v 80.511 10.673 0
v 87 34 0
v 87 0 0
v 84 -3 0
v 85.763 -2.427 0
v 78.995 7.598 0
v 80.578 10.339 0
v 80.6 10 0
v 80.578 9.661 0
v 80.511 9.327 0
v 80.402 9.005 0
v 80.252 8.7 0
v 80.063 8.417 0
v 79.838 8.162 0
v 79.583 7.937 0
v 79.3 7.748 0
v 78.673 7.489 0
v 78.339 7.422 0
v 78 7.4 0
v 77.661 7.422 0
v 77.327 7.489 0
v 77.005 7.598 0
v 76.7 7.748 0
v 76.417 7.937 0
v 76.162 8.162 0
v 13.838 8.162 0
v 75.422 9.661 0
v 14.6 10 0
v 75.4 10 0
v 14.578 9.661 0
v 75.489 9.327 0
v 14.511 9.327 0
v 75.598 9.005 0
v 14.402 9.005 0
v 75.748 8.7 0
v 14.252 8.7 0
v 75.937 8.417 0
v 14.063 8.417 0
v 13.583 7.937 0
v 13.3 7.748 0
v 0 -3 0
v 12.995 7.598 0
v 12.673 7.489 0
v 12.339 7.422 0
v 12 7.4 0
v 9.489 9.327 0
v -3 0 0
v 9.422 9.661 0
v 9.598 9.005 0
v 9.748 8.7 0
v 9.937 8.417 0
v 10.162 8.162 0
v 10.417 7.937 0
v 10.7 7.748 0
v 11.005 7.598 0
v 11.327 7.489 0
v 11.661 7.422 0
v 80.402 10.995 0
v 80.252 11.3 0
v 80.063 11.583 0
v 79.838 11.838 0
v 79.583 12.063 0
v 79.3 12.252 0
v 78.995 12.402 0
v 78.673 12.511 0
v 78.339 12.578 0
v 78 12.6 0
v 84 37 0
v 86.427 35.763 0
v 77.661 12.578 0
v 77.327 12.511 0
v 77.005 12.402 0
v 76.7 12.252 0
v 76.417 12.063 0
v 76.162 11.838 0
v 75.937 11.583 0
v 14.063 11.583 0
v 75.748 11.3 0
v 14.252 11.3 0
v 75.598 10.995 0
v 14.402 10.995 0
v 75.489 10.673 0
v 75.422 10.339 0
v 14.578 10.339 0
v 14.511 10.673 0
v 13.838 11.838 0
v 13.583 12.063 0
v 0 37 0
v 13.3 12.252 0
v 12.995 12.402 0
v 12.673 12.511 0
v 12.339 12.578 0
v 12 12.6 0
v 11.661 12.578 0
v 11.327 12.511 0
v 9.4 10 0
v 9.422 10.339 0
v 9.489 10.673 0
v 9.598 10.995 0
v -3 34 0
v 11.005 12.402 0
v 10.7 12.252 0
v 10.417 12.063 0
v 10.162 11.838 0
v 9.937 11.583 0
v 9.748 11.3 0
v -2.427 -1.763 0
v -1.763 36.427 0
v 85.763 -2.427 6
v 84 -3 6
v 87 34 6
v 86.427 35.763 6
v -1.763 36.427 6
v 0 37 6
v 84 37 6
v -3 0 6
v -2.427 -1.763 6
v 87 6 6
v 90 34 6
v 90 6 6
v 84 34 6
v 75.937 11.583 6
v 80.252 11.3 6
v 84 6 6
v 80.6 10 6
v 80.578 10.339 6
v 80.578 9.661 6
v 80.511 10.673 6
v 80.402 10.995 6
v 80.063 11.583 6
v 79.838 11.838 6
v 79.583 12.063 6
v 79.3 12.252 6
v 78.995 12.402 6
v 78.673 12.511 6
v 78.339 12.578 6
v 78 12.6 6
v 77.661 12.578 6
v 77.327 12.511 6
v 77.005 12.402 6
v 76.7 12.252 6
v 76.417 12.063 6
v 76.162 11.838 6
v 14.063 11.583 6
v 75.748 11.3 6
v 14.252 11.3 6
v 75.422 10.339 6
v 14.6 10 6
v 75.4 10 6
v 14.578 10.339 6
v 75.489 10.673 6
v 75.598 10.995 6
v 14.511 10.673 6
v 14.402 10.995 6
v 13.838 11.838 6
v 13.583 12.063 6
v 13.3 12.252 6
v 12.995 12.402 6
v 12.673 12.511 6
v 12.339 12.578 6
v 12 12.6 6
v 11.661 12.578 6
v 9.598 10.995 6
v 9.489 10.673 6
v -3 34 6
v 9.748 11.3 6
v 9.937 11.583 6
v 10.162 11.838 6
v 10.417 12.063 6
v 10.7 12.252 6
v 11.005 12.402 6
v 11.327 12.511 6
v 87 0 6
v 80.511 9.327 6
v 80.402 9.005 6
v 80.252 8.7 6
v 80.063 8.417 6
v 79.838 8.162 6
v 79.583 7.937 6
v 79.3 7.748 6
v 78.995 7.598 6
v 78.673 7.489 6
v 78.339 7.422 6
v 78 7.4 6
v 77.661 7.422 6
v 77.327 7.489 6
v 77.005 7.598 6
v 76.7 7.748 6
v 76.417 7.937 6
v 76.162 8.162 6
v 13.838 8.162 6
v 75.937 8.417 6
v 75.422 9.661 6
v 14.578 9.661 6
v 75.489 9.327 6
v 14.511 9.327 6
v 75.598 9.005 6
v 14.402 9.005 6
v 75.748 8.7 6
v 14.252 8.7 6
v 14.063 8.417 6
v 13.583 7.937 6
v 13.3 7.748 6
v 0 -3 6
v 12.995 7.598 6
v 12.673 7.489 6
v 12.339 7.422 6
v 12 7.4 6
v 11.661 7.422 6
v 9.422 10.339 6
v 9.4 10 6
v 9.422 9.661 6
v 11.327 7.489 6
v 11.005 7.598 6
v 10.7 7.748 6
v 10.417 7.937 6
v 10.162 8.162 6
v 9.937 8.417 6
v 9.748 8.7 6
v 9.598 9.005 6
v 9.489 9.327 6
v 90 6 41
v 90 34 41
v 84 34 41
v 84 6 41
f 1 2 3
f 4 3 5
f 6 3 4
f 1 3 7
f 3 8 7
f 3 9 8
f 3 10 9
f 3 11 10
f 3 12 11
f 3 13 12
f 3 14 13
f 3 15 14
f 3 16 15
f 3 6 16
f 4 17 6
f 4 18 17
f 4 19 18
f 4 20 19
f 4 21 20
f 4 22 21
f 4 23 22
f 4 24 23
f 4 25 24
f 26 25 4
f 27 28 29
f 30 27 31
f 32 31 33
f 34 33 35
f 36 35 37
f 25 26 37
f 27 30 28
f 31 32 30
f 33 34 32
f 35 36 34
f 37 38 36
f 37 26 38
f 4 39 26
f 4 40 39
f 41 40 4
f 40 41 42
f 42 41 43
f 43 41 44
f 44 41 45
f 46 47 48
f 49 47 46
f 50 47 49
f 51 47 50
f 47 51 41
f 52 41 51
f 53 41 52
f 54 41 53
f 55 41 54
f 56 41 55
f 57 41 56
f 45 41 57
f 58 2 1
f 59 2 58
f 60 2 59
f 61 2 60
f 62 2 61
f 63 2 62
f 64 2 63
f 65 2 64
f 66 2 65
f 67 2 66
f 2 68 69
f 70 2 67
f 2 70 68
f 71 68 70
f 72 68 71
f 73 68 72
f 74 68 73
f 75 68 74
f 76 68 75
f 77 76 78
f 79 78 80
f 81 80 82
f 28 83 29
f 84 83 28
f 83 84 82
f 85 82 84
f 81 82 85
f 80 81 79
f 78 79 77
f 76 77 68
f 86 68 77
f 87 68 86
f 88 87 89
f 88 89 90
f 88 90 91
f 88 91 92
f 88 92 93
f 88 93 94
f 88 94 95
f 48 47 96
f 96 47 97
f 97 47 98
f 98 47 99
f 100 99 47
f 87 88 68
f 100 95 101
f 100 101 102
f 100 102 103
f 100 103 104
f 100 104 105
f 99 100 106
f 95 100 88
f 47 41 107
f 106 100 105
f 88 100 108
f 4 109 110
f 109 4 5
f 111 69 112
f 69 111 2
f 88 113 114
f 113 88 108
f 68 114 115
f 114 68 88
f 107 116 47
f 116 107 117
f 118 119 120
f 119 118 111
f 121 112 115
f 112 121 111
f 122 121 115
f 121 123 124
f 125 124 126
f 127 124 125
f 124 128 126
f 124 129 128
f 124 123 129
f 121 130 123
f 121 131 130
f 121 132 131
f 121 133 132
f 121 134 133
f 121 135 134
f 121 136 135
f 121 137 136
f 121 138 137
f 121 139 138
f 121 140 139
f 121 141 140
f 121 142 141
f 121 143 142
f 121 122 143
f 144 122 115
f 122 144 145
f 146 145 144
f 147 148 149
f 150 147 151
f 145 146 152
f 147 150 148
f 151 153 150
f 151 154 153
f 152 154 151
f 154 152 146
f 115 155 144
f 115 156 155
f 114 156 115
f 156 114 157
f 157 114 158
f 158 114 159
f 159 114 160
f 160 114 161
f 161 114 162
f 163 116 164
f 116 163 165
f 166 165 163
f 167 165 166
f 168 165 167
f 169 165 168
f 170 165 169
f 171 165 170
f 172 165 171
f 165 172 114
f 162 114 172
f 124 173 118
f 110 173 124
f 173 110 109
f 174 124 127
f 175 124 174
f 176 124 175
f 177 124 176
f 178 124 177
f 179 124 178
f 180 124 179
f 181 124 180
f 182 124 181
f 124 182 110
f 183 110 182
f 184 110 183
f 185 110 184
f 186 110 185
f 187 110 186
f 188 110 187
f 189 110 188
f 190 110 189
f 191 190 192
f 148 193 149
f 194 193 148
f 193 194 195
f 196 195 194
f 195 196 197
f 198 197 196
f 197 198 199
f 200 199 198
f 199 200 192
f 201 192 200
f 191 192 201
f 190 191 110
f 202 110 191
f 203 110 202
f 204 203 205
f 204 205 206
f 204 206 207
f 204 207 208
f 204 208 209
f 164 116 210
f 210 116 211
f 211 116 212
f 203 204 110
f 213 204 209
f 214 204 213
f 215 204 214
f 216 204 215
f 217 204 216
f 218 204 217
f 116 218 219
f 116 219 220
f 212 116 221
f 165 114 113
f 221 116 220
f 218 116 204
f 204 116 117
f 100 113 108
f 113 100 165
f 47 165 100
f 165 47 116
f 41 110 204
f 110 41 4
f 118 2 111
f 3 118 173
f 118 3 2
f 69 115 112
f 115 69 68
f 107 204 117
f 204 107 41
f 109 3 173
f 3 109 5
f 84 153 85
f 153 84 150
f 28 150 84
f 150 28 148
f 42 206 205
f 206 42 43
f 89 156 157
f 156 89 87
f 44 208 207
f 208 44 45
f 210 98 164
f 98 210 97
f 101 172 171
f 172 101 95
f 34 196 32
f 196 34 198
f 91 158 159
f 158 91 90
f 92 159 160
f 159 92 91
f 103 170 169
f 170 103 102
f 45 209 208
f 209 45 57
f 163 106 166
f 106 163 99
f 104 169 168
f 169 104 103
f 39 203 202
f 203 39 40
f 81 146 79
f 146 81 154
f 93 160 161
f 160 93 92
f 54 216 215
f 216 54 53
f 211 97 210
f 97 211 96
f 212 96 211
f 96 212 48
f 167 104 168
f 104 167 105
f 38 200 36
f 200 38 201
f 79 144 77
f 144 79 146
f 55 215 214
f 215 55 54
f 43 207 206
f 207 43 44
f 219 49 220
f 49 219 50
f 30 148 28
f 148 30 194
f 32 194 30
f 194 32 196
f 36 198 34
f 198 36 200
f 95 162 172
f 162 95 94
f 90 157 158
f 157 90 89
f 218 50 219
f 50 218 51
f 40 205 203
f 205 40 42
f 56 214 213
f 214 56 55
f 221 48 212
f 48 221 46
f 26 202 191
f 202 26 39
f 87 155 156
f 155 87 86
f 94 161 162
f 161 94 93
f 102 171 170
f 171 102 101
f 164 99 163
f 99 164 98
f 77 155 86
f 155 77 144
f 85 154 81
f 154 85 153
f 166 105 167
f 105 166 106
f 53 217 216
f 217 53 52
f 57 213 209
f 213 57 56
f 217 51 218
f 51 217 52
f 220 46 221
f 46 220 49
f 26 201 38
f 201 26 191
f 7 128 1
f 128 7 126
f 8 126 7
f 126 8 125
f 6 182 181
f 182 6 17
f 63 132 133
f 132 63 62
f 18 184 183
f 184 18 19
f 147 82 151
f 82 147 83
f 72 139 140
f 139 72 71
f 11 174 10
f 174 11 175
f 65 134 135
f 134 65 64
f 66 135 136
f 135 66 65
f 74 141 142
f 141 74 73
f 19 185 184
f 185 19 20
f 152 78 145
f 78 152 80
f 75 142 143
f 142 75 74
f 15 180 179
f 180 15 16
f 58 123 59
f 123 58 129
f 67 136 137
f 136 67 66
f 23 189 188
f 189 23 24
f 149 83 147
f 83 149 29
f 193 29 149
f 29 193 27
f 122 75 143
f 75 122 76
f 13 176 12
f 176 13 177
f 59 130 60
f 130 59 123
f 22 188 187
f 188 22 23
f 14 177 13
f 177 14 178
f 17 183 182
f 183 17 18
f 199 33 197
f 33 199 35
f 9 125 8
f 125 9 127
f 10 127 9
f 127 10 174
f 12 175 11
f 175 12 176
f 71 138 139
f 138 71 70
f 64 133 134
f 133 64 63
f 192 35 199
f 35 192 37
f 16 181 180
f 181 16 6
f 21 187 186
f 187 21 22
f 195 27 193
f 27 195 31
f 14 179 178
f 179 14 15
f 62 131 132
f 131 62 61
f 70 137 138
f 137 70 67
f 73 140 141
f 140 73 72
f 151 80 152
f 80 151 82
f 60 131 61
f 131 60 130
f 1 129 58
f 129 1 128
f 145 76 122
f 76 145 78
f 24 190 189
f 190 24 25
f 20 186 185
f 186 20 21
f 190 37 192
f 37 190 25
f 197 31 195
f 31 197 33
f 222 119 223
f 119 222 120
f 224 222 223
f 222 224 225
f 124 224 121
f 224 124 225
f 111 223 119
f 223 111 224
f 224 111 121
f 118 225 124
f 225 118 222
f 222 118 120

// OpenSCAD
part_name = "QA Camera Mount 1778435312197";

base_len = 90;
base_wid = 40;
base_thk = 6;

riser_h = 35;
riser_thk = 6;
riser_wid = 28;

hole_d = 5.2;
hole_edge_x = 12;
hole_edge_y = 10;
hole_spacing_x = 66;
hole_spacing_y = 20;

corner_r = 3;
clearance = 0.6;

module rounded_plate(l, w, t, r=2) {
linear_extrude(height=t)
offset(r=r)
square([l - 2*r, w - 2*r], center=false);
}

module base_body() {
difference() {
rounded_plate(base_len, base_wid, base_thk, corner_r);

translate([hole_edge_x, hole_edge_y, -0.1])
cylinder(h=base_thk + 0.2, d=hole_d, $fn=48);

translate([hole_edge_x + hole_spacing_x, hole_edge_y, -0.1])
cylinder(h=base_thk + 0.2, d=hole_d, $fn=48);
}
}

module riser_body() {
translate([base_len - riser_thk, (base_wid - riser_wid)/2, base_thk])
cube([riser_thk, riser_wid, riser_h], center=false);
}

module qa_camera_mount() {
union() {
base_body();
riser_body();
}
}

module fit_check() {
// Printable envelope check, laid flat for easy inspection.
difference() {
cube([base_len + 2*clearance, base_wid + 2*clearance, base_thk + riser_h + 2*clearance], center=false);
translate([clearance, clearance, clearance]) qa_camera_mount();
}
}

// Main part
qa_camera_mount();

// Uncomment for fit-check export:
// translate([0, base_wid + 15, 0]) fit_check();
